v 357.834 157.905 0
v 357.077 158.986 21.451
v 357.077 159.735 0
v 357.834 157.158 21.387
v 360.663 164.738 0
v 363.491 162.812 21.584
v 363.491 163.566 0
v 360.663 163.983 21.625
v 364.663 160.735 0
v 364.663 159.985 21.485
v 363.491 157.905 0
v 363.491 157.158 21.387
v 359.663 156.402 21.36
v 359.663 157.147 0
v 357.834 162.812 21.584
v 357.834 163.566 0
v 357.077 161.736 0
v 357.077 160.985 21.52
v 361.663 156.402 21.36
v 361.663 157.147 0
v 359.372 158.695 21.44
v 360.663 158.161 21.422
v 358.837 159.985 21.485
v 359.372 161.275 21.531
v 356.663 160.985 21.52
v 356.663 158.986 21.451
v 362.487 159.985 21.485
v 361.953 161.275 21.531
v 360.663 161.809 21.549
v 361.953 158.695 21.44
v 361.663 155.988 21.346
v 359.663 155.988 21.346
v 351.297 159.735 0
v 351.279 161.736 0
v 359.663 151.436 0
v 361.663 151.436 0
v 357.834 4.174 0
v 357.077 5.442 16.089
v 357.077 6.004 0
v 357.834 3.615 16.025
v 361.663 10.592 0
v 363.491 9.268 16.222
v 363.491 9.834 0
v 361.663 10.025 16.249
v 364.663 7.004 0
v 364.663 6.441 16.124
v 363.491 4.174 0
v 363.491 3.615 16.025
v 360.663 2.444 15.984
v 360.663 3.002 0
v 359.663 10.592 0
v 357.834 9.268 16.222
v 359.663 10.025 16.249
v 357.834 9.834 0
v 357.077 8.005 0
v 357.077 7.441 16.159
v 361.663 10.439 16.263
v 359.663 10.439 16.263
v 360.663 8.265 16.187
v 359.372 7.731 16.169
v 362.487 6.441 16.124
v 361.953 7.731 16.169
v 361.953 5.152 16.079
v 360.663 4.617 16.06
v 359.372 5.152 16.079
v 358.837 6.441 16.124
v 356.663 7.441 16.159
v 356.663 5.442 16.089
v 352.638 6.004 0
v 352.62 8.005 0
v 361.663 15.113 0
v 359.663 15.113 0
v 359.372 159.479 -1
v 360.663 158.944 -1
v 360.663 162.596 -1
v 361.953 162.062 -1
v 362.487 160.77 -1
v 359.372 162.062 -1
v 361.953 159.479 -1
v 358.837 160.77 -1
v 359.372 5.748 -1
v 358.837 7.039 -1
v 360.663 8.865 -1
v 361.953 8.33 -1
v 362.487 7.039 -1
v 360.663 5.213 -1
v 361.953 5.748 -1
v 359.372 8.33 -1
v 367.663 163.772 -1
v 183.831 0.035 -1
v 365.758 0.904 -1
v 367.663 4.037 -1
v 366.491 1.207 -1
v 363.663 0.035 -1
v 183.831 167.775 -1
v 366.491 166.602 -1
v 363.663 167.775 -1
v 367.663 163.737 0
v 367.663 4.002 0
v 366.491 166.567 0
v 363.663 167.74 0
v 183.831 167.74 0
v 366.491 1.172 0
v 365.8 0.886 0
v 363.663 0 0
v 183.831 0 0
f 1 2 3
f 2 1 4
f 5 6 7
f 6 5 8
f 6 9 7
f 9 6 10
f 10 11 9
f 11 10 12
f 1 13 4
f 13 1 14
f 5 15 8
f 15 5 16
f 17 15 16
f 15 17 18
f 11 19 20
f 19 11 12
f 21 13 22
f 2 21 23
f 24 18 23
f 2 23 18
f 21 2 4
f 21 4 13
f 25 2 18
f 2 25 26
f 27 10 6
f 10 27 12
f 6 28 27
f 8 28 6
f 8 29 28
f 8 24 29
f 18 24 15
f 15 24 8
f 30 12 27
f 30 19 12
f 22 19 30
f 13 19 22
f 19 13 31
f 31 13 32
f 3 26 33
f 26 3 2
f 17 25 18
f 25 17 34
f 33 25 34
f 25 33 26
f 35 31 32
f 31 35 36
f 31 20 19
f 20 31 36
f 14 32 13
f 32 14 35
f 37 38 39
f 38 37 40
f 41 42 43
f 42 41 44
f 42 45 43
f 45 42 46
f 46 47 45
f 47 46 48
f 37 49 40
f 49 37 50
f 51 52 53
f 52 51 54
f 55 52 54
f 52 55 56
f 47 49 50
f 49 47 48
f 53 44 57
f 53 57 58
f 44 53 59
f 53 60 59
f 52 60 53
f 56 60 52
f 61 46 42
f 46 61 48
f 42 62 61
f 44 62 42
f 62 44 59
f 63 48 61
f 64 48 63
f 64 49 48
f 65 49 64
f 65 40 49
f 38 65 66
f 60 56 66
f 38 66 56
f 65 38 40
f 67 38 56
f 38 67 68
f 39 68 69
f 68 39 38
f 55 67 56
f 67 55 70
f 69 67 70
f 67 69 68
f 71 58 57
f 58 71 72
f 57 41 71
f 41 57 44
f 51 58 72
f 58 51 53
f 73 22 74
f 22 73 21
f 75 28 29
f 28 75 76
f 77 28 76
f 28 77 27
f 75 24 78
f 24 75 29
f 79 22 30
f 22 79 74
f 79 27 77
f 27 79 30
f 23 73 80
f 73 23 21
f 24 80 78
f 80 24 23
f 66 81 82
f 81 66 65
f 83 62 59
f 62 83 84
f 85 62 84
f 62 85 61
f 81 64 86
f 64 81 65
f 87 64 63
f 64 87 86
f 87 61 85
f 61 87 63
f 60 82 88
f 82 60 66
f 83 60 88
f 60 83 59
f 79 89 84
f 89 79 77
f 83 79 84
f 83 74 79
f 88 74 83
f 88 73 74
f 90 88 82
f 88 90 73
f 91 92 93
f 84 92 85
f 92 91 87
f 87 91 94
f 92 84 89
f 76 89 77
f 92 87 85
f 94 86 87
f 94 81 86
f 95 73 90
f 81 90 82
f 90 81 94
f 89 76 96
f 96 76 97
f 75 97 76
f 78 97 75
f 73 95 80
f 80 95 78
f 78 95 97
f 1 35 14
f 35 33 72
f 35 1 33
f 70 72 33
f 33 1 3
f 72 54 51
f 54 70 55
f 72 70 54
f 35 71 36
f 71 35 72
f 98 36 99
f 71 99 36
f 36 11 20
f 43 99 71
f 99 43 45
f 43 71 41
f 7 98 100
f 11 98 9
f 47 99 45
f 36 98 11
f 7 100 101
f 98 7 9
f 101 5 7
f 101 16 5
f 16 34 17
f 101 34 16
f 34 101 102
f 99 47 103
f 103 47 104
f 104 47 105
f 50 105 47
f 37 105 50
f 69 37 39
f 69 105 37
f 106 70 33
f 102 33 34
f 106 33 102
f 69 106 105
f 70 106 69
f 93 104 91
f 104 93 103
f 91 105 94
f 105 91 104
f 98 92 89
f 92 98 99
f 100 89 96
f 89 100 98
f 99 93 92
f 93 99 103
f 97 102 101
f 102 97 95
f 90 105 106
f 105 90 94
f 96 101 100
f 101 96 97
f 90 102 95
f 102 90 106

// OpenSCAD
// Generated by SolidPython 1.1.3 on 2024-07-24 01:23:33
$fn = 8;


difference() {
	intersection() {
		union() {
			difference() {
				rotate(a = 2.0000000000, v = [1, 0, 0]) {
					translate(v = [0, 0, 16.4445000000]) {
						translate(v = [0, 157.6375000000, 0]) {
							translate(v = [10, 0, 0]) {
								difference() {
									translate(v = [-3, 0, 0]) {
										translate(v = [0, -150.6375000000, 0]) {
											translate(v = [0, 0, -68.5555000000]) {
												union() {
													translate(v = [0, 0, 0]) {
														translate(v = [0, 0, 0]) {
															union() {
																cylinder(h = 68, r = 4.0000000000);
																rotate(a = 90, v = [1, 0, 0]) {
																	linear_extrude(center = true, height = 2) {
																		polygon(paths = [[0, 1, 2, 3]], points = [[0, 0], [0, 68], [4.0000000000, 68], [21.0000000000, 0]]);
																	}
																}
																rotate(a = 90, v = [0, 0, 1]) {
																	rotate(a = 90, v = [1, 0, 0]) {
																		linear_extrude(center = true, height = 2) {
																			polygon(paths = [[0, 1, 2, 3]], points = [[0, 0], [0, 68], [4.0000000000, 68], [21.0000000000, 0]]);
																		}
																	}
																}
															}
														}
													}
													translate(v = [0, 0, 0]) {
														translate(v = [0, 153.6375000000, 0]) {
															union() {
																cylinder(h = 68, r = 4.0000000000);
																rotate(a = 90, v = [1, 0, 0]) {
																	linear_extrude(center = true, height = 2) {
																		polygon(paths = [[0, 1, 2, 3]], points = [[0, 0], [0, 68], [4.0000000000, 68], [21.0000000000, 0]]);
																	}
																}
																rotate(a = 270, v = [0, 0, 1]) {
																	rotate(a = 90, v = [1, 0, 0]) {
																		linear_extrude(center = true, height = 2) {
																			polygon(paths = [[0, 1, 2, 3]], points = [[0, 0], [0, 68], [4.0000000000, 68], [21.0000000000, 0]]);
																		}
																	}
																}
															}
														}
													}
													translate(v = [353.6625000000, 0, 0]) {
														translate(v = [0, 153.6375000000, 0]) {
															union() {
																cylinder(h = 68, r = 4.0000000000);
																rotate(a = 180, v = [0, 0, 1]) {
																	rotate(a = 90, v = [1, 0, 0]) {
																		linear_extrude(center = true, height = 2) {
																			polygon(paths = [[0, 1, 2, 3]], points = [[0, 0], [0, 68], [4.0000000000, 68], [21.0000000000, 0]]);
																		}
																	}
																}
																rotate(a = 270, v = [0, 0, 1]) {
																	rotate(a = 90, v = [1, 0, 0]) {
																		linear_extrude(center = true, height = 2) {
																			polygon(paths = [[0, 1, 2, 3]], points = [[0, 0], [0, 68], [4.0000000000, 68], [21.0000000000, 0]]);
																		}
																	}
																}
															}
														}
													}
													translate(v = [353.6625000000, 0, 0]) {
														translate(v = [0, 0, 0]) {
															union() {
																cylinder(h = 68, r = 4.0000000000);
																rotate(a = 180, v = [0, 0, 1]) {
																	rotate(a = 90, v = [1, 0, 0]) {
																		linear_extrude(center = true, height = 2) {
																			polygon(paths = [[0, 1, 2, 3]], points = [[0, 0], [0, 68], [4.0000000000, 68], [21.0000000000, 0]]);
																		}
																	}
																}
																rotate(a = 90, v = [0, 0, 1]) {
																	rotate(a = 90, v = [1, 0, 0]) {
																		linear_extrude(center = true, height = 2) {
																			polygon(paths = [[0, 1, 2, 3]], points = [[0, 0], [0, 68], [4.0000000000, 68], [21.0000000000, 0]]);
																		}
																	}
																}
															}
														}
													}
												}
											}
										}
									}
									translate(v = [-3, 0, 0]) {
										translate(v = [0, -150.6375000000, 0]) {
											union() {
												translate(v = [0, 0, 0]) {
													translate(v = [0, 0, 0]) {
														cylinder(center = true, h = 272, r = 1.8250000000);
													}
												}
												translate(v = [0, 0, 0]) {
													translate(v = [0, 153.6375000000, 0]) {
														cylinder(center = true, h = 272, r = 1.8250000000);
													}
												}
												translate(v = [353.6625000000, 0, 0]) {
													translate(v = [0, 153.6375000000, 0]) {
														cylinder(center = true, h = 272, r = 1.8250000000);
													}
												}
												translate(v = [353.6625000000, 0, 0]) {
													translate(v = [0, 0, 0]) {
														cylinder(center = true, h = 272, r = 1.8250000000);
													}
												}
											}
										}
									}
								}
							}
						}
					}
				}
				translate(v = [0, 0, -1]) {
					translate(v = [0, 0, -100]) {
						translate(v = [0, -83.8187500000, 0]) {
							translate(v = [-183.8312500000, 0, 0]) {
								cube(size = [735.3250000000, 335.2750000000, 100]);
							}
						}
					}
				}
			}
			intersection() {
				translate(v = [0, 0, -1]) {
					translate(v = [-183.8312500000, 0, 0]) {
						translate(v = [0, -83.8187500000, 0]) {
							cube(size = [735.3250000000, 335.2750000000, 1]);
						}
					}
				}
				rotate(a = 2.0000000000, v = [1, 0, 0]) {
					translate(v = [0, 0, 16.4445000000]) {
						translate(v = [0, 157.6375000000, 0]) {
							translate(v = [10, 0, 0]) {
								translate(v = [0, 0, -34.0000000000]) {
									translate(v = [173.8312500000, 0, 0]) {
										translate(v = [0, -73.8187500000, 0]) {
											minkowski() {
												cube(center = true, size = [359.6625000000, 159.6375000000, 68]);
												cylinder(center = true, h = 0.5555000000, r = 4);
											}
										}
									}
								}
							}
						}
					}
				}
			}
		}
		translate(v = [0, 0, 16.4445000000]) {
			translate(v = [0, 157.6375000000, 0]) {
				translate(v = [10, 0, 0]) {
					translate(v = [173.8312500000, 0, 0]) {
						translate(v = [0, -251.4562500000, 0]) {
							translate(v = [0, 0, -34.0000000000]) {
								cube(size = [183.8312500000, 335.2750000000, 136]);
							}
						}
					}
				}
			}
		}
	}
	rotate(a = 2.0000000000, v = [1, 0, 0]) {
		translate(v = [0, 0, 16.4445000000]) {
			translate(v = [0, 157.6375000000, 0]) {
				translate(v = [10, 0, 0]) {
					translate(v = [-3, 0, 0]) {
						translate(v = [0, -150.6375000000, 0]) {
							union() {
								translate(v = [0, 0, 0]) {
									translate(v = [0, 0, 0]) {
										cylinder(center = true, h = 272, r = 1.8250000000);
									}
								}
								translate(v = [0, 0, 0]) {
									translate(v = [0, 153.6375000000, 0]) {
										cylinder(center = true, h = 272, r = 1.8250000000);
									}
								}
								translate(v = [353.6625000000, 0, 0]) {
									translate(v = [0, 153.6375000000, 0]) {
										cylinder(center = true, h = 272, r = 1.8250000000);
									}
								}
								translate(v = [353.6625000000, 0, 0]) {
									translate(v = [0, 0, 0]) {
										cylinder(center = true, h = 272, r = 1.8250000000);
									}
								}
							}
						}
					}
				}
			}
		}
	}
}
/***********************************************
*********      SolidPython code:      **********
************************************************
 
#!/usr/bin/env python3

import argparse
from asyncio import subprocess
import json
# import math
import re
import logging
import os
# import os.path
import subprocess
# import time

from solid import *
from solid.utils import *

from parameters import Parameters
from keyboard import Keyboard
from cable import Cable

# Set logger level variables
console_logging_level = logging.WARN
file_logging_level = logging.DEBUG


# Get root logger and set main logger level to DEBUG
logger = logging.getLogger()
logger.setLevel(logging.DEBUG)


# Create formatters
console_formatter = logging.Formatter('%(name)s %(levelname)s: %(funcName)s: [%(lineno)d]: %(message)s')
file_formatter = logging.Formatter('%(asctime)s %(levelname)s %(name)s: %(funcName)s: [%(lineno)d]: %(message)s')

# Create console handler and set level to info
console_handler = logging.StreamHandler()
console_handler.setLevel(console_logging_level)

# Add formatter to console_handler
console_handler.setFormatter(console_formatter)

# Add console handler to logger
logger.addHandler(console_handler)

# Get file info that will be used to creat log file
script_location = Path(os.path.dirname(os.path.realpath(__file__)))
log_file_name = 'generator.log'
log_file_path = script_location / log_file_name

# Create file handler and set level to info
file_handler = logging.FileHandler(log_file_path, mode = 'w')
file_handler.setLevel(file_logging_level)

# Add formatter to file_handler
file_handler.setFormatter(file_formatter)

# Add file handler to logger
logger.addHandler(file_handler)


# Helper for parser to wnsure filename argument has to correct extension
def CheckExt(choices):
    class Act(argparse.Action):
        def __call__(self,parser,namespace,fname,option_string=None):
            ext = os.path.splitext(fname)[1][1:]
            if ext not in choices:
                option_string = '({})'.format(option_string) if option_string else ''
                parser.error("file doesn't end with one of {}{}".format(choices,option_string))
            else:
                setattr(namespace,self.dest,fname)

    return Act



def main():

    parser = argparse.ArgumentParser(description='Build custom keyboard SCAD file using keyboard layout editor format')
    parser.add_argument('-i', '--input-file', metavar = 'layout_json_file_name.json', help = 'A path to a keyboard layout editor json file', required = True, action=CheckExt({'json'}))
    # parser.add_argument('-o', '--output-folder', metavar = 'scad', help = 'A path to a folder to store the generated open scad file')
    parser.add_argument('-p', '--parameter-file', metavar = 'parameters.json', help = 'A JSON file containing paramters for the object buing made', default = None, action=CheckExt({'json'}))
    parser.add_argument('-s', '--section', metavar = 'section_num', help = 'The number of the section that should be built', type = int, default = -1)
    parser.add_argument('-a', '--all-sections', help = 'Output all the parts for all possible sections in separate files', default = False, action = 'store_true')
    parser.add_argument('-e', '--exploded', help = 'Create test file with each section shown as an exploded view', default = False, action = 'store_true')
    parser.add_argument('-f', '--fragments', metavar = 'num_fragments', help = 'The number of fragments to be used when creating curves', type = int, default = 8)
    parser.add_argument('-r', '--render', help = 'Render an STL from the generated scad file', default = False, action = 'store_true')
    parser.add_argument('--switch-type-in-filename', help = 'Add the switch type name and stabilizer type name to the filname', default = False, action = 'store_true')

    # Parse command line arguments
    args = parser.parse_args()
    logger.debug(vars(args))

    # Create Path object from input file argument
    input_file_path = Path(args.input_file)

    # Get base folder path
    base_path = input_file_path.parent

    # Get input file name onle
    file_name_only = input_file_path.name
    
    # Get layout name from file name
    layout_name = input_file_path.stem

    # Generate output scad and stl output folder paths
    output_base_folder = base_path / layout_name
    scad_folder_path = output_base_folder / 'scad'
    stl_folder_path = output_base_folder / 'stl'

    # Ensure all outpur folders exists
    if output_base_folder.is_dir() == False:
        output_base_folder.mkdir()

    if scad_folder_path.is_dir() == False:
        scad_folder_path.mkdir()

    if stl_folder_path.is_dir() == False:
        stl_folder_path.mkdir()

    logger.debug('layout_name: %s', str(layout_name))
    logger.debug('base_path: %s', str(base_path))
    logger.debug('file_name_only: %s', str(file_name_only))
    
    # define output file extensions
    scad_postfix = '.scad'
    stl_postfix  = '.stl'

    # Set fragments per circle
    FRAGMENTS = args.fragments
    logger.debug('\tFragments: %d', FRAGMENTS)

    # Pattern and Replacement strings to be used when trying to turn keyboard-layout-editor raw output into valid JSON
    json_key_pattern = '([{,])([xywha1]+):'
    json_key_replace = '\\1"\\2":'

    # Open JSON layout file
    logger.debug('Open layout file %s', input_file_path)
    try:
        # Try with utf-8 encoding specified
        f = open(input_file_path, encoding="utf-8")
    except:
        # Failed to open
        logger.info('Failed to open layout file with utf-8 encoding specified. Try opening without specifying an encoding')
        try:
            # Try opening with no encoding spcificed
            f = open(input_file_path)
        except:
            logger.error('Failed to open layout file both spefifying utf-8 andcoding and not specifying any encodeing. Exiting')
            exit(1)

    logger.debug('Read layout JSON string from file %s', input_file_path)
    try:
        keyboard_layout = f.read()
    except UnicodeDecodeError:
        logger.error('Unable to decode layout file. Please provide utf-8 encoded files')
        exit(-1)

    keyboard_layout_dict = None

    # Load keyboard layout dictionary
    logger.debug('Parse layout file JSON string')
    try:
        # Attempt to parse to provided JSON string
        keyboard_layout_dict = json.loads(keyboard_layout)
        logger.debug('Valid Json Parsed')
    except:
        # Failed to parse the JSON test.
        # This most likely means that the keybaord-layout-editor raw output was provided
        # Attempt to modify that string to make it valid JSON
        keyboard_layout = '[%s]' % (keyboard_layout)
        keyboard_layout = re.sub(json_key_pattern, json_key_replace, keyboard_layout)
        try:
            keyboard_layout_dict = json.loads(keyboard_layout)
            logger.info('Initial layout Json Invalid. Json modified and parsed')
        except:
            logger.error('Failed to parse layout json after attempt at correction.')
            raise

    logger.debug('keyboard_layout_dict: %s', str(keyboard_layout_dict))


    # Read parameter file
    parameter_dict = None
    if args.parameter_file is not None:
        # Open JSON parameter file
        logger.debug('Open parameter file %s', args.parameter_file)
        try:
            # Try with utf-8 encoding specified
            f = open(args.parameter_file, encoding="utf-8")
        except:
            # Failed to open
            logger.info('Failed to open parameter file with utf-8 encoding specified. Try opening without specifying an encoding')
            try:
                # Try opening with no encoding spcificed
                f = open(args.parameter_fil)
            except:
                logger.error('Failed to open parameter file both spefifying utf-8 andcoding and not specifying any encodeing. Exiting')
                exit(1)
        

        logger.debug('Read JSON string from parameter file %s', args.parameter_file)
        try:
             parameter_file_text = f.read()
        except UnicodeDecodeError:
            logger.error('Unable to decode parameter file. Please provide utf-8 encoded files')
            exit(-1)
       
        logger.debug('Parse parameter JSON string')
        try:
            parameter_dict = json.loads(parameter_file_text)
            logger.debug('Valid Json Parsed')
        except:
            logger.error('Failed to parse parameter JSON file.')
            raise

        logger.debug('parameter_dict: %s', str(parameter_dict))


    # Set parameters from imput file
    parameters = Parameters(parameter_dict)
    
    # Create Keyboard instance
    keyboard = Keyboard(parameters)

    # Process the keyboard layout object
    keyboard.process_keyboard_layout(keyboard_layout_dict)
    keyboard.process_custom_shapes()

    logger.debug('kerf: %f', keyboard.kerf)

    # Dictionary of SolidPython solid objects that need to be rendered to SCAD and to STL if desired
    solid_object_dict = {}

    # Create objects for each of the generated sections
    if args.all_sections == True:
        # Iterate over all sections generated and add all sections to solid_object_dict
        for section in range(keyboard.get_top_section_count()):
            # Set current section for generator
            keyboard.set_section(section)

            # Create dict for section
            solid_object_dict[section] = {}

            # Add top assembly, plate, and all assembly to section dict
            solid_object_dict[section]['top'] = keyboard.get_assembly(top = True)
            solid_object_dict[section]['all'] = keyboard.get_assembly(all = True)
            solid_object_dict[section]['plate'] = keyboard.get_assembly(plate_only = True)

            # If there is a bottom section for the current section add it to section dict
            if section < keyboard.get_bottom_section_count():
                solid_object_dict[section]['bottom'] = keyboard.get_assembly(bottom = True)
            
    # Create exploded object
    elif args.exploded == True:
        solid_object_dict[-1] = {}
        solid_object_dict[-1]['top'] = union()
        solid_object_dict[-1]['plate'] = union()
        solid_object_dict[-1]['bottom'] = union()
        for section in range(keyboard.get_top_section_count()):
            keyboard.set_section(section)
            solid_object_dict[-1]['top'] += up(5 * section) ( right(10 * section) ( keyboard.get_assembly(top = True) ) )
            solid_object_dict[-1]['plate'] += up(5 * section) ( right(10 * section) ( keyboard.get_assembly(plate_only = True) ) )
            if section < keyboard.get_bottom_section_count():
                solid_object_dict[-1]['bottom'] += up(5 * section) ( right(10 * section) ( keyboard.get_assembly(bottom = True) ) )
    

    # Create objects for a specified section
    elif args.section > -1:
        # Set desired section to create
        keyboard.set_section(args.section)

        # Create dict for section
        solid_object_dict[args.section] = {}

        # Add top assembly, plate, and all assembly to section dict
        solid_object_dict[args.section]['top'] = keyboard.get_assembly(top = True)
        solid_object_dict[args.section]['all'] = keyboard.get_assembly(all = True)
        solid_object_dict[args.section]['plate'] = keyboard.get_assembly(plate_only = True)

        # If there is a bottom section for the current section add it to section dict
        if args.section < keyboard.get_bottom_section_count():
            solid_object_dict[args.section]['bottom'] = keyboard.get_assembly(bottom = True)

    # Create an objects that are not split into sections. No other options were specified
    else:
        logger.debug('Create whole object. No other options specified')
        solid_object_dict['all'] = {}
        solid_object_dict['all']['top'] = keyboard.get_assembly(top = True)
        solid_object_dict['all']['bottom'] = keyboard.get_assembly(bottom = True)
        solid_object_dict['all']['all'] = keyboard.get_assembly(all = True)
        solid_object_dict['all']['plate'] = keyboard.get_assembly(plate_only = True)
    
    # Add global items that are not dependant on the sctions or parts of the item to build
    solid_object_dict['global'] = {}

    # Generate a strain relief piece for the cable hole
    if parameters.cable_hole == True:
        cable = Cable(parameters)
        solid_object_dict['global']['cable_holder_main'] = cable.holder_main()
        solid_object_dict['global']['cable_holder_clamp'] = cable.holder_clamp()
        solid_object_dict['global']['cable_holder_all'] = cable.holder_all()

    print(parameters)
    print('Case Height: %f, Case Width: %f\n' % (parameters.real_case_height, parameters.real_case_width))
    
    logger.info('Case Height: %f, Case Width: %f', parameters.real_case_height, parameters.real_case_width)
    logger.info('Sections In Top: %d', keyboard.get_top_section_count())
    logger.info('Sections In Bottom: %d', keyboard.get_bottom_section_count())


    ############################################################
    # Render SCAD and STL files
    ############################################################
    subprocess_dict = {}

    switch_type_for_filename = ''
    stab_type_for_filename = ''

    for section in solid_object_dict.keys():

        if args.switch_type_in_filename == True:
            switch_type_for_filename = '_' + parameters.switch_type
            stab_type_for_filename = '_' + parameters.stabilizer_type

        section_postfix = ''

        # Creating global items that have no relaton to switch type
        if isinstance(section, str) and section == 'global':
            switch_type_for_filename = ''
            stab_type_for_filename = ''
        
        # If the current object dict section is an int greater than -1 add the section number to the filename
        if isinstance(section, int) and section > -1:
            section_postfix = '_section_%d' % (section)
        
        if args.exploded == True:
            section_postfix = '_exploded'

        for part_name in solid_object_dict[section].keys():
            part_name_formatted = '_' + part_name

            scad_file_name = scad_folder_path / (layout_name + section_postfix + part_name_formatted + switch_type_for_filename + stab_type_for_filename + scad_postfix)
            stl_file_name = stl_folder_path / (layout_name + section_postfix + part_name_formatted + switch_type_for_filename + stab_type_for_filename + stl_postfix)

            if solid_object_dict[section][part_name] is not None:
                logger.info('Generate scad file with name %s', scad_file_name)
                # Generate SCAD file from assembly
                scad_render_to_file(solid_object_dict[section][part_name], scad_file_name, file_header=f'$fn = {FRAGMENTS};')
                print('Generated scad file with name', scad_file_name)
                
                # Render STL if option is chosen
                if args.render:
                    logger.debug('Render STL from SCAD')
                    logger.info('Generate stl file with name %s from %s', stl_file_name, scad_file_name)

                    openscad_command_list = ['openscad', '-o', '%s' % (stl_file_name), '%s' % (scad_file_name)]
                    subprocess_dict[stl_file_name] = subprocess.Popen(openscad_command_list)
    
    
    ################################################################
    #  Wait for render processes to complete
    ################################################################
    if args.render:
        logger.debug(subprocess_dict)
        running = True
        while running == True:
            running = False
            for stl_file_name in subprocess_dict.keys():
                p = subprocess_dict[stl_file_name]
                if p is not None:
                    # running = True
                    rcode = None
                    try:
                        rcode = p.wait(.1)
                    except subprocess.TimeoutExpired as err:
                        running = True
                    if rcode is not None:
                        logger.info('Render Complete: file: %s', stl_file_name)
                        print('Render Complete: file:', stl_file_name)
                        subprocess_dict[stl_file_name] = None
            # time.sleep(1)



    logger.info('Generation Complete')

if __name__ == "__main__":
    main()
 
 
************************************************/
